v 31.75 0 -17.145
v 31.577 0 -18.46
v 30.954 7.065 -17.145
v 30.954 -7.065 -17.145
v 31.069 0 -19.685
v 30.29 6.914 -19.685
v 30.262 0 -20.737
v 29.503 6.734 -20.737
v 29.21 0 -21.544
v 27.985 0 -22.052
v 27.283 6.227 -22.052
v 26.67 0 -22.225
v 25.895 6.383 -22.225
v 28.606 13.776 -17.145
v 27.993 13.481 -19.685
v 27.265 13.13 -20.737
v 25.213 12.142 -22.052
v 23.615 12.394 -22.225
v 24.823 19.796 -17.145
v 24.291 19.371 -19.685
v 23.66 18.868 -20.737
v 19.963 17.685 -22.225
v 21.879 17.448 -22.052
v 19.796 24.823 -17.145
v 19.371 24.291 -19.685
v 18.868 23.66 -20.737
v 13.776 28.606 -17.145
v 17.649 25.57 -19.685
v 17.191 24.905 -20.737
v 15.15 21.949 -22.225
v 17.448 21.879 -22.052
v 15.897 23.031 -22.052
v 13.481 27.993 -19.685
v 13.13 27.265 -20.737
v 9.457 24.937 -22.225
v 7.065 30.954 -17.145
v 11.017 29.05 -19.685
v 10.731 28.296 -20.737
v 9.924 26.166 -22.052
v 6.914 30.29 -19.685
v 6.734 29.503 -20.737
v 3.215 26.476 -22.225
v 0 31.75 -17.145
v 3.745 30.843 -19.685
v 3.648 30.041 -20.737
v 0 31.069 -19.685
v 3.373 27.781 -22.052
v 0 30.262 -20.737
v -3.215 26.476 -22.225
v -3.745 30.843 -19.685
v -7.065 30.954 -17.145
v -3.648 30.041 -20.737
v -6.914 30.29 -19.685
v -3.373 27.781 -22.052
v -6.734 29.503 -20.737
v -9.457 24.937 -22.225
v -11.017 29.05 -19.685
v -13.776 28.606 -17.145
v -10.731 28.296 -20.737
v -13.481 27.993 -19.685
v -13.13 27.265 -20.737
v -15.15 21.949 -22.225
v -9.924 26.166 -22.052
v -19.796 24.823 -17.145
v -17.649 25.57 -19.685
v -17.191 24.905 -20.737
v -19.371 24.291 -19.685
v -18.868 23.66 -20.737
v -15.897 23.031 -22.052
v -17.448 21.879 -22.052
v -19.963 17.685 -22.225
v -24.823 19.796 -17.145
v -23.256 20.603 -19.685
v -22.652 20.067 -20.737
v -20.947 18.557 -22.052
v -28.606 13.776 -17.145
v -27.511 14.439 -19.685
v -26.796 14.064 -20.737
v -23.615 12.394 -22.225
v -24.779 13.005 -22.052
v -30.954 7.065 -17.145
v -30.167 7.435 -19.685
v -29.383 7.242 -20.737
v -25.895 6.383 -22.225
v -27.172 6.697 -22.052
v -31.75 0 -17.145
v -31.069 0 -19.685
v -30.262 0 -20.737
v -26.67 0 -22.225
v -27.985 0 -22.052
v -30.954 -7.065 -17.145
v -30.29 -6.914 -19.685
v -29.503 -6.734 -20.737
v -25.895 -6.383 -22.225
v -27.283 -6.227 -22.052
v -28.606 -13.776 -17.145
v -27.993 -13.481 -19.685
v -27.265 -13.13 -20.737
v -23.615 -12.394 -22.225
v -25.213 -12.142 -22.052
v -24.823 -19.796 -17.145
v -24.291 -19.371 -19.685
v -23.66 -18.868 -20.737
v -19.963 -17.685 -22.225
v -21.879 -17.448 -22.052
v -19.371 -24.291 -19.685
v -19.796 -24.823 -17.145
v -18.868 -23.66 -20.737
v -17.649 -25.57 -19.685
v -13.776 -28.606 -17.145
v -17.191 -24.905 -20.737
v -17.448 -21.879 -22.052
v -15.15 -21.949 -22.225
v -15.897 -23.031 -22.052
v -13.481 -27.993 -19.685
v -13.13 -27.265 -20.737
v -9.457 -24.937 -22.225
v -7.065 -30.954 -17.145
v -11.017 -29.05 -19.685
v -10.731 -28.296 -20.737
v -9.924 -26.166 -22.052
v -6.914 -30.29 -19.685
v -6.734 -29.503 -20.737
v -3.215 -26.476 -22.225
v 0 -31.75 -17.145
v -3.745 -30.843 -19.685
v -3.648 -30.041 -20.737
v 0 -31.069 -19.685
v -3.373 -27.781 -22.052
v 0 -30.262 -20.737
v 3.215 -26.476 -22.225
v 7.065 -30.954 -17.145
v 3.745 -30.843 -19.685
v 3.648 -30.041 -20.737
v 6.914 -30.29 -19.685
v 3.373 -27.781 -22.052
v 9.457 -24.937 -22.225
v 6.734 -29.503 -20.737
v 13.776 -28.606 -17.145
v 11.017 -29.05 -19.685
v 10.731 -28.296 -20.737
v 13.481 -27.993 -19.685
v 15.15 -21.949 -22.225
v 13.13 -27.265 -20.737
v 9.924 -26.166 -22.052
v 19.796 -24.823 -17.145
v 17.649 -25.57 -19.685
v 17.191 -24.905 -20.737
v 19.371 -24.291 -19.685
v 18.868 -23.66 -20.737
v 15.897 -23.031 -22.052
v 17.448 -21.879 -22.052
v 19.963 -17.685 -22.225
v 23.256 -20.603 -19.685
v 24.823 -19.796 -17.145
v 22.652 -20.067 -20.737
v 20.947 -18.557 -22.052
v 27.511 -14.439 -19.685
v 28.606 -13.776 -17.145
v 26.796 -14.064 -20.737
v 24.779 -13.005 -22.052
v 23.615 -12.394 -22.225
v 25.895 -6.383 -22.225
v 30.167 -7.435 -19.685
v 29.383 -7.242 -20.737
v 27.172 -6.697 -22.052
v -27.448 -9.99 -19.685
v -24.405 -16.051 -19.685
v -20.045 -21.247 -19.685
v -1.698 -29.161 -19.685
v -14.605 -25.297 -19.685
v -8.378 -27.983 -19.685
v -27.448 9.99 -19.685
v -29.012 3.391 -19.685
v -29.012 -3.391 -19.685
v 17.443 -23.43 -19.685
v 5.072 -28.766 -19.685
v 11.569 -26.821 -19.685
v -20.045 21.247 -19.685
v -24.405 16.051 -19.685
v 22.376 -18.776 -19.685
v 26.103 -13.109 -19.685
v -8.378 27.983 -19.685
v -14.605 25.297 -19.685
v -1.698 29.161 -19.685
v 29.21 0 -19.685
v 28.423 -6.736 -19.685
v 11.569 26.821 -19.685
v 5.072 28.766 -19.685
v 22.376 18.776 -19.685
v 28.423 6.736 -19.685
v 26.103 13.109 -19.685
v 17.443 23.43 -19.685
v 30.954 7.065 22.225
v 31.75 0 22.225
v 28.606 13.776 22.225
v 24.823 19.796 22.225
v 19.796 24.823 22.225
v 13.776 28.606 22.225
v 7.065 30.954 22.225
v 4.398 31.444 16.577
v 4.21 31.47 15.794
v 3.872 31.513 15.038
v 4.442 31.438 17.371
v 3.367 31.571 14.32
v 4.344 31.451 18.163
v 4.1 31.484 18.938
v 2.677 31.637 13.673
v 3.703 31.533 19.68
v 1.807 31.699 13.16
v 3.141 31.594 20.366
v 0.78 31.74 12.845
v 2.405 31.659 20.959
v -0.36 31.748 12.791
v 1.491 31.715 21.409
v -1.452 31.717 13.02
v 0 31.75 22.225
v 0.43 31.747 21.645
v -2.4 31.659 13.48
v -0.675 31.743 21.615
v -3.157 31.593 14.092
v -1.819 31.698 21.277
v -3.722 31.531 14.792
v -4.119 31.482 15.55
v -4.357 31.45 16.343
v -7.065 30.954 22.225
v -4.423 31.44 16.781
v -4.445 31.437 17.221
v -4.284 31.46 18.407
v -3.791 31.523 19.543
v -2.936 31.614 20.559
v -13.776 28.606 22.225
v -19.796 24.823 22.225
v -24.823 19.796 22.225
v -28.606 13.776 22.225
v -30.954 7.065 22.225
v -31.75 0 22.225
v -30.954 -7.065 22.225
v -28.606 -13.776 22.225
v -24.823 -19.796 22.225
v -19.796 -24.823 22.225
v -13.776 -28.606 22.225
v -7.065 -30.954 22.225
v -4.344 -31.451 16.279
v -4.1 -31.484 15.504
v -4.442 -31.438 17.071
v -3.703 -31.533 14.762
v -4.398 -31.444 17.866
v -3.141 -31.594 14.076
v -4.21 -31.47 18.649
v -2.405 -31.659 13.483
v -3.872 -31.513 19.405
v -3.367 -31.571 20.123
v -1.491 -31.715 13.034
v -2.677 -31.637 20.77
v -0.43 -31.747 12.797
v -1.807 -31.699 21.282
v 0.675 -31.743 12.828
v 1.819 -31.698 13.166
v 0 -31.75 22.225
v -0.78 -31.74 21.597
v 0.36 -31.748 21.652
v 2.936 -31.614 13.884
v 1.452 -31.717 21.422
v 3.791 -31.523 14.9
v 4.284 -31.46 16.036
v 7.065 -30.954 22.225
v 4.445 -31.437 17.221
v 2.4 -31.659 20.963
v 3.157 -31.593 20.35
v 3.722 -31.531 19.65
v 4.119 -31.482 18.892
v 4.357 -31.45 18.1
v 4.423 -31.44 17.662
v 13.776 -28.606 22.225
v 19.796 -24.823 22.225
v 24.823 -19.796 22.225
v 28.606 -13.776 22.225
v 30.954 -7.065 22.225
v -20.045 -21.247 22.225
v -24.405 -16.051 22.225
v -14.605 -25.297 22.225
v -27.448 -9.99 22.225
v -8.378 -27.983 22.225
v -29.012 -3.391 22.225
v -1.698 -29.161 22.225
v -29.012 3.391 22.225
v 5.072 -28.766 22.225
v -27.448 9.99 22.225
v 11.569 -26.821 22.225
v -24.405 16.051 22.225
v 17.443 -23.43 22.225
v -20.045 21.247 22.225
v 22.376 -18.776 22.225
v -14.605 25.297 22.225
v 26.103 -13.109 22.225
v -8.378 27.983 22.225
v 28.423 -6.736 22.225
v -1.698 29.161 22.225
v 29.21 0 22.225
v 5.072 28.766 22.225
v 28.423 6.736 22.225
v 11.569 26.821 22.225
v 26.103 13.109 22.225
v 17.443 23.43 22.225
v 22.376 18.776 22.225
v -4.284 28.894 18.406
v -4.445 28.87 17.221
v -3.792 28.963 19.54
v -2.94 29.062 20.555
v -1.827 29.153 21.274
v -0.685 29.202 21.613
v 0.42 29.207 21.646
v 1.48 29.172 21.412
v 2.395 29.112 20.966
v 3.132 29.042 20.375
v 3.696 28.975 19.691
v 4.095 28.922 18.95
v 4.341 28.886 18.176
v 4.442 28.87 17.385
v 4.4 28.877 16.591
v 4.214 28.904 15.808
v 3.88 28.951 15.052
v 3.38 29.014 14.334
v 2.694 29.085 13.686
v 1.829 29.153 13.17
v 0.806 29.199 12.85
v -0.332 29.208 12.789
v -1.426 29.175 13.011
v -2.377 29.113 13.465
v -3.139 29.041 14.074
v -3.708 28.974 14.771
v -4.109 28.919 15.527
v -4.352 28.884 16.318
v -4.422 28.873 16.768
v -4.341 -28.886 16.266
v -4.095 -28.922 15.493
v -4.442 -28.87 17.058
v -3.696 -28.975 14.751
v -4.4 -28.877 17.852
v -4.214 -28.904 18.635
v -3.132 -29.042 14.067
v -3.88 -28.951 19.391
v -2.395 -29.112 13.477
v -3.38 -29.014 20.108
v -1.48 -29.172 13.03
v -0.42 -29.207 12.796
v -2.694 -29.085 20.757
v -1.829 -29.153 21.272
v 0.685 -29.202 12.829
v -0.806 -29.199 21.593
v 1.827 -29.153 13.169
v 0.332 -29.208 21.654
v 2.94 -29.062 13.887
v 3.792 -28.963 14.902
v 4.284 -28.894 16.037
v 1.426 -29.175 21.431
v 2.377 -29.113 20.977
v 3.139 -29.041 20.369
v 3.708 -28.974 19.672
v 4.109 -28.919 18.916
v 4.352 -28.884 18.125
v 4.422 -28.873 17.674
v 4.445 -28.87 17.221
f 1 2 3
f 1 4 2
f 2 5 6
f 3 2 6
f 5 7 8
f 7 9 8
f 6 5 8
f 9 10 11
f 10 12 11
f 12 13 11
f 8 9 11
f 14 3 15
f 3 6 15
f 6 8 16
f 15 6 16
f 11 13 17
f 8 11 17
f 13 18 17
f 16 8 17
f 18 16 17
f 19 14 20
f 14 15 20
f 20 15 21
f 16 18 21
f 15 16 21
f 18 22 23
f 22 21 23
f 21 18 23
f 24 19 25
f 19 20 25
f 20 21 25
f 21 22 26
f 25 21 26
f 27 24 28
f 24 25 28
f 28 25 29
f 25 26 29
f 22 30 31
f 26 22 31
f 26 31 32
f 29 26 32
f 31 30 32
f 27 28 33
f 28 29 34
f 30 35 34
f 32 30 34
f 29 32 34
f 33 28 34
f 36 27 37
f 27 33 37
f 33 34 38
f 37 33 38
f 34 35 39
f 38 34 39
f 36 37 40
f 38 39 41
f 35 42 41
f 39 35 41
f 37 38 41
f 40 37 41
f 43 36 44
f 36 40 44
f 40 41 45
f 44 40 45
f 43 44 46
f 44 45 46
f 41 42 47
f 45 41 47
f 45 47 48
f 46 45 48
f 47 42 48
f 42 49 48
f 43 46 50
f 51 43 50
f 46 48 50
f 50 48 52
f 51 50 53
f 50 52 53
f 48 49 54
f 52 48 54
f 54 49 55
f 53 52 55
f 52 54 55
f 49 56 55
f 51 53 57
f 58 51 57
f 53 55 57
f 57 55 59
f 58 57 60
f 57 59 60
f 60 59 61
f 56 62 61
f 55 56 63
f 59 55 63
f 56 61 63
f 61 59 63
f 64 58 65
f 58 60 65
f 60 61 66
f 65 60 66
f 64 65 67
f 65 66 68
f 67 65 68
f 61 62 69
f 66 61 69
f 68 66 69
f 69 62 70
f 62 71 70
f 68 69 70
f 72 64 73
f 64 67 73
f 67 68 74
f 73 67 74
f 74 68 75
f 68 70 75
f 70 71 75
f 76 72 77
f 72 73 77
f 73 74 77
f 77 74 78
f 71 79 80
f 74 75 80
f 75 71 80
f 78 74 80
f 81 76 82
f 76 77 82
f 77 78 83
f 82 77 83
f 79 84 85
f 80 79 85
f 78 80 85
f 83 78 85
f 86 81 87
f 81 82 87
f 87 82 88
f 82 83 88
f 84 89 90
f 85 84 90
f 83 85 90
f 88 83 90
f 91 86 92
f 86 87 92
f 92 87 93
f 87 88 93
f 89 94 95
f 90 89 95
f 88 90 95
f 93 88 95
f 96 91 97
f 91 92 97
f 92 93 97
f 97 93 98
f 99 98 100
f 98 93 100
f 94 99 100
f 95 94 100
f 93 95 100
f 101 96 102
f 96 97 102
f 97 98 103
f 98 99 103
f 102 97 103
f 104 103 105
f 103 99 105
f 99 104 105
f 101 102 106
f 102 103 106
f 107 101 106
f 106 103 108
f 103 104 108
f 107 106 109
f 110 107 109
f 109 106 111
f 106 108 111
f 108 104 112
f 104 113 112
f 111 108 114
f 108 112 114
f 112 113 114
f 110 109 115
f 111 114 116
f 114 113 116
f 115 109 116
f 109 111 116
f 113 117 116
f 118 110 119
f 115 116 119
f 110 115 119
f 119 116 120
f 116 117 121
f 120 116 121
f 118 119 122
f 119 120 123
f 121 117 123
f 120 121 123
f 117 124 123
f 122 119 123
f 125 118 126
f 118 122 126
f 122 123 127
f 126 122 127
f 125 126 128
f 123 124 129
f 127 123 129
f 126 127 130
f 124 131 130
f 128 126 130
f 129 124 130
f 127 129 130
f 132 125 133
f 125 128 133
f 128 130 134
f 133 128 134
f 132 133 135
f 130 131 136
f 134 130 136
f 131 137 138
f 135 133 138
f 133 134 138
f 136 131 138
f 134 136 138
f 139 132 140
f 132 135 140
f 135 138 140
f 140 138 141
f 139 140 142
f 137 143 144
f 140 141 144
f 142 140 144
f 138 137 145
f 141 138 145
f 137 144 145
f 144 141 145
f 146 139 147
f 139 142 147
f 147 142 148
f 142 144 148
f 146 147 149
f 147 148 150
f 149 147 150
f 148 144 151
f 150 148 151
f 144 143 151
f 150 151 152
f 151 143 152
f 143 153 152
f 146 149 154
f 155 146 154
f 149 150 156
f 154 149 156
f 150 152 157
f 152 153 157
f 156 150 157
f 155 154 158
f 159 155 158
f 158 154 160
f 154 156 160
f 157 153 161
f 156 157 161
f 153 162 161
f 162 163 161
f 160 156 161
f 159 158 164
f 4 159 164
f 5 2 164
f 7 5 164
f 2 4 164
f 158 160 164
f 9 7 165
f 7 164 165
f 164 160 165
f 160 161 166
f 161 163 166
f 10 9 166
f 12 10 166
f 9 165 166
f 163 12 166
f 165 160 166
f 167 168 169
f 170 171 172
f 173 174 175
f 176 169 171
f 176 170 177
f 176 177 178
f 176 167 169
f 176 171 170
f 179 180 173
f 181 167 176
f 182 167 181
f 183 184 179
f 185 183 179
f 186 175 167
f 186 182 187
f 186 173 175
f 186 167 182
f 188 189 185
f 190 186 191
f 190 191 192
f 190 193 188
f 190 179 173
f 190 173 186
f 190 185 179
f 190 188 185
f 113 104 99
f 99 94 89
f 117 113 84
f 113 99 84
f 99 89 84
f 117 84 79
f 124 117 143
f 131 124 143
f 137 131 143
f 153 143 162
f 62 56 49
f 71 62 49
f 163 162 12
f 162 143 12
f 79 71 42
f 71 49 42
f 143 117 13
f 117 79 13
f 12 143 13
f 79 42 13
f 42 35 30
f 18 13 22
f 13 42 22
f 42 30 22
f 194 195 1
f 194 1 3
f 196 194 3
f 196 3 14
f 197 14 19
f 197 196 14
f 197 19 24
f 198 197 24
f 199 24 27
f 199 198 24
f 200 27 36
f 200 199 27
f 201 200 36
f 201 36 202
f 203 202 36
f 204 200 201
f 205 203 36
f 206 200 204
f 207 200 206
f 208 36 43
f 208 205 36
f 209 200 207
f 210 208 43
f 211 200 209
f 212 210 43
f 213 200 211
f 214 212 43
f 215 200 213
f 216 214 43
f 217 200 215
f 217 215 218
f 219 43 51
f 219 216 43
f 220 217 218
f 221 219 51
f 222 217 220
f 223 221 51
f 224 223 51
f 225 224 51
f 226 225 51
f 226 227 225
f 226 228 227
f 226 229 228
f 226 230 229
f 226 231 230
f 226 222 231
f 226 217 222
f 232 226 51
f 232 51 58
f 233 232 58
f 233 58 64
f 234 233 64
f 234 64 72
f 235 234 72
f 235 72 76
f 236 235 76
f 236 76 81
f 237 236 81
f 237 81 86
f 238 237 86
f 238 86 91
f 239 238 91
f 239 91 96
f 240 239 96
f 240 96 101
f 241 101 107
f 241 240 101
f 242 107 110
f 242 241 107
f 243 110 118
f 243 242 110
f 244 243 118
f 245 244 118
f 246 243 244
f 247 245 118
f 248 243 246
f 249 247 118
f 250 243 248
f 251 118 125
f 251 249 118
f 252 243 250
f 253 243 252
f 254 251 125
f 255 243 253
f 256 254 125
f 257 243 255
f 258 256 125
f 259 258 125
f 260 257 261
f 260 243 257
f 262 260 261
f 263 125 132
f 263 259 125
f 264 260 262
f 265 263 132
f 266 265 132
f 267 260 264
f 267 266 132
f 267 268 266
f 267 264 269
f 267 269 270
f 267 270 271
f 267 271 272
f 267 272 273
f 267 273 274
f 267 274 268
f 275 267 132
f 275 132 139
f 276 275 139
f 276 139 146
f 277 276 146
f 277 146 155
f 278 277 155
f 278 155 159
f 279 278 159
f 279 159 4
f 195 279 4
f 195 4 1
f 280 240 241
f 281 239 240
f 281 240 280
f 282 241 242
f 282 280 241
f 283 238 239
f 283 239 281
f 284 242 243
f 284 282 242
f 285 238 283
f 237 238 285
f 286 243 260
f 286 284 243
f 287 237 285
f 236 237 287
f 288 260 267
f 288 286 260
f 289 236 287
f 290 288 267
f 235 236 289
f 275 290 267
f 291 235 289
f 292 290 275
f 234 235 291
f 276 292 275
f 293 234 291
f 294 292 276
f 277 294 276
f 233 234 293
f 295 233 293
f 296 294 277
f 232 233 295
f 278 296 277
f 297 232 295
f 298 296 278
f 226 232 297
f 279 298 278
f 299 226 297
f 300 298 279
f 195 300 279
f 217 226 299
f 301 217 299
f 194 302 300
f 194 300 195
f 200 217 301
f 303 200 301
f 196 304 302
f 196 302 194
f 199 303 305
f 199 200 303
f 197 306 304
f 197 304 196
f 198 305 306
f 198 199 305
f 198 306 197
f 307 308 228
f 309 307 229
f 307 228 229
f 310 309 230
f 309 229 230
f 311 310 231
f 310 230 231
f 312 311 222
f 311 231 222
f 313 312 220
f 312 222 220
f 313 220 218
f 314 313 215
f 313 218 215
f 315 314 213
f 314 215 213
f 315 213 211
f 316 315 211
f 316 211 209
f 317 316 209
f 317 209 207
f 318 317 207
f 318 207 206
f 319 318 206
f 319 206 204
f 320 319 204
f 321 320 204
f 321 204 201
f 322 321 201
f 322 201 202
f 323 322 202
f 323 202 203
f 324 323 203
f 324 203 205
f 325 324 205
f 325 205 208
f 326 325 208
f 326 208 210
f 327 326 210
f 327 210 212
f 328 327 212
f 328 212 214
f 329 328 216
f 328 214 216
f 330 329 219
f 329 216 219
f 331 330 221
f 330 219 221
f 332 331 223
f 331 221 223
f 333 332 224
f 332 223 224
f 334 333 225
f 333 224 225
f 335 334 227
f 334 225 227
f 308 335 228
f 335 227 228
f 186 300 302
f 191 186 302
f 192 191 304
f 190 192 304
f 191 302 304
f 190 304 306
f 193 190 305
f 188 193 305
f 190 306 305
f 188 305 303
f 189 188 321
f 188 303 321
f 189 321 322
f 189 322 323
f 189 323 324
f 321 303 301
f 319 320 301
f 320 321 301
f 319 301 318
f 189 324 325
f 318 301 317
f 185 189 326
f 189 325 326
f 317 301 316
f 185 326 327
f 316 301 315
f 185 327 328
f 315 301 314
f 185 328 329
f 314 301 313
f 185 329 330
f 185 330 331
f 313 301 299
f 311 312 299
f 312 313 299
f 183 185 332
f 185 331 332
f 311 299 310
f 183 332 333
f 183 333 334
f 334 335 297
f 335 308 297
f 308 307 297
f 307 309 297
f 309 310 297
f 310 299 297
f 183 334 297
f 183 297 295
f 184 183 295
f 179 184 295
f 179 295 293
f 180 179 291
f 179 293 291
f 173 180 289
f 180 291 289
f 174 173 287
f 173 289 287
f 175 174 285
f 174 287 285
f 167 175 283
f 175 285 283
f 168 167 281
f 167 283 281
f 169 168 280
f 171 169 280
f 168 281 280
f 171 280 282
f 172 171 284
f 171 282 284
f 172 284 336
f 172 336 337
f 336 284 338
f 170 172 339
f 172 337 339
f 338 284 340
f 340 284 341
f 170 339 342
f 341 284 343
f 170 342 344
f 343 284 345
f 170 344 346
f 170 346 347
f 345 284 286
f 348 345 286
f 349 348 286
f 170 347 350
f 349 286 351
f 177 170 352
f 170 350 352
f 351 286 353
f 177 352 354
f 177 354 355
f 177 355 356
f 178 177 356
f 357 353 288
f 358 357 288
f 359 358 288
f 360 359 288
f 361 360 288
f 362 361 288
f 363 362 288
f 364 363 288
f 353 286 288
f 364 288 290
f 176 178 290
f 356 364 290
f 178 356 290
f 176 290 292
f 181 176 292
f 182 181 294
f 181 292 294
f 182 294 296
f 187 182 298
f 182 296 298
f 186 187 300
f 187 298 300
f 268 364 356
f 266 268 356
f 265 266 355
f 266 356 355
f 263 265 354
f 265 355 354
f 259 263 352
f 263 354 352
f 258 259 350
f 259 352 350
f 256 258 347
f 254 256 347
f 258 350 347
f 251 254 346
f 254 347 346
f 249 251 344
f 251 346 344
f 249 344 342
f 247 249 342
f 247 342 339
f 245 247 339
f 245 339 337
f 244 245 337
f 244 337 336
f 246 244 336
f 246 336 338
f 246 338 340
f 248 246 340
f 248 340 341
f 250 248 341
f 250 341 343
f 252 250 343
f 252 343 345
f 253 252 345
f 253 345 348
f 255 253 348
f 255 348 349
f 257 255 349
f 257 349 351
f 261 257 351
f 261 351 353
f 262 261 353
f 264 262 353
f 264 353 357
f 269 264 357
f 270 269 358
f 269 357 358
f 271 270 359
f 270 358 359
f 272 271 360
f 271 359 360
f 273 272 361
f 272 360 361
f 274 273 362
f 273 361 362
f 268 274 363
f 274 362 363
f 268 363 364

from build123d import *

# Parameters (mm, degrees)
F0_R     = 31.75
F1_DEPTH = 22.225
F2_T     = -2.54
F4_D     = 8.89
F4_DEPTH = 31.751
F5_D     = 8.89
F6_R     = 5.08


with BuildPart() as f1:
    # F0 (on Top) → F1 (new body, symmetric)
    with BuildSketch(Plane.XY):
        Circle(F0_R)
    extrude(amount=F1_DEPTH, both=True)

    # F2
    f2_openings = [f1.faces().sort_by_distance(p)[0] for p in [
        (0, 0, 22.225),
    ]]
    offset(amount=F2_T, openings=f2_openings)

    # F4 (through all, one way)
    with BuildSketch(Plane(origin=(0, 0, 0), x_dir=(1, 0, 0), z_dir=(0, 1, 0))):
        with Locations((0, -17.2211941394)):
            Circle(F4_D / 2)
    extrude(amount=-F4_DEPTH, mode=Mode.SUBTRACT)

    # F5 (through all)
    with Locations(Plane.XZ):
        with Locations((0, 17.2211941394)):
            Hole(F5_D / 2)

    # F6
    f6_edges = [f1.edges().sort_by_distance(p)[0] for p in [
        (-31.75, 0, -22.225),
    ]]
    fillet(f6_edges, radius=F6_R)


solid = f1.part
